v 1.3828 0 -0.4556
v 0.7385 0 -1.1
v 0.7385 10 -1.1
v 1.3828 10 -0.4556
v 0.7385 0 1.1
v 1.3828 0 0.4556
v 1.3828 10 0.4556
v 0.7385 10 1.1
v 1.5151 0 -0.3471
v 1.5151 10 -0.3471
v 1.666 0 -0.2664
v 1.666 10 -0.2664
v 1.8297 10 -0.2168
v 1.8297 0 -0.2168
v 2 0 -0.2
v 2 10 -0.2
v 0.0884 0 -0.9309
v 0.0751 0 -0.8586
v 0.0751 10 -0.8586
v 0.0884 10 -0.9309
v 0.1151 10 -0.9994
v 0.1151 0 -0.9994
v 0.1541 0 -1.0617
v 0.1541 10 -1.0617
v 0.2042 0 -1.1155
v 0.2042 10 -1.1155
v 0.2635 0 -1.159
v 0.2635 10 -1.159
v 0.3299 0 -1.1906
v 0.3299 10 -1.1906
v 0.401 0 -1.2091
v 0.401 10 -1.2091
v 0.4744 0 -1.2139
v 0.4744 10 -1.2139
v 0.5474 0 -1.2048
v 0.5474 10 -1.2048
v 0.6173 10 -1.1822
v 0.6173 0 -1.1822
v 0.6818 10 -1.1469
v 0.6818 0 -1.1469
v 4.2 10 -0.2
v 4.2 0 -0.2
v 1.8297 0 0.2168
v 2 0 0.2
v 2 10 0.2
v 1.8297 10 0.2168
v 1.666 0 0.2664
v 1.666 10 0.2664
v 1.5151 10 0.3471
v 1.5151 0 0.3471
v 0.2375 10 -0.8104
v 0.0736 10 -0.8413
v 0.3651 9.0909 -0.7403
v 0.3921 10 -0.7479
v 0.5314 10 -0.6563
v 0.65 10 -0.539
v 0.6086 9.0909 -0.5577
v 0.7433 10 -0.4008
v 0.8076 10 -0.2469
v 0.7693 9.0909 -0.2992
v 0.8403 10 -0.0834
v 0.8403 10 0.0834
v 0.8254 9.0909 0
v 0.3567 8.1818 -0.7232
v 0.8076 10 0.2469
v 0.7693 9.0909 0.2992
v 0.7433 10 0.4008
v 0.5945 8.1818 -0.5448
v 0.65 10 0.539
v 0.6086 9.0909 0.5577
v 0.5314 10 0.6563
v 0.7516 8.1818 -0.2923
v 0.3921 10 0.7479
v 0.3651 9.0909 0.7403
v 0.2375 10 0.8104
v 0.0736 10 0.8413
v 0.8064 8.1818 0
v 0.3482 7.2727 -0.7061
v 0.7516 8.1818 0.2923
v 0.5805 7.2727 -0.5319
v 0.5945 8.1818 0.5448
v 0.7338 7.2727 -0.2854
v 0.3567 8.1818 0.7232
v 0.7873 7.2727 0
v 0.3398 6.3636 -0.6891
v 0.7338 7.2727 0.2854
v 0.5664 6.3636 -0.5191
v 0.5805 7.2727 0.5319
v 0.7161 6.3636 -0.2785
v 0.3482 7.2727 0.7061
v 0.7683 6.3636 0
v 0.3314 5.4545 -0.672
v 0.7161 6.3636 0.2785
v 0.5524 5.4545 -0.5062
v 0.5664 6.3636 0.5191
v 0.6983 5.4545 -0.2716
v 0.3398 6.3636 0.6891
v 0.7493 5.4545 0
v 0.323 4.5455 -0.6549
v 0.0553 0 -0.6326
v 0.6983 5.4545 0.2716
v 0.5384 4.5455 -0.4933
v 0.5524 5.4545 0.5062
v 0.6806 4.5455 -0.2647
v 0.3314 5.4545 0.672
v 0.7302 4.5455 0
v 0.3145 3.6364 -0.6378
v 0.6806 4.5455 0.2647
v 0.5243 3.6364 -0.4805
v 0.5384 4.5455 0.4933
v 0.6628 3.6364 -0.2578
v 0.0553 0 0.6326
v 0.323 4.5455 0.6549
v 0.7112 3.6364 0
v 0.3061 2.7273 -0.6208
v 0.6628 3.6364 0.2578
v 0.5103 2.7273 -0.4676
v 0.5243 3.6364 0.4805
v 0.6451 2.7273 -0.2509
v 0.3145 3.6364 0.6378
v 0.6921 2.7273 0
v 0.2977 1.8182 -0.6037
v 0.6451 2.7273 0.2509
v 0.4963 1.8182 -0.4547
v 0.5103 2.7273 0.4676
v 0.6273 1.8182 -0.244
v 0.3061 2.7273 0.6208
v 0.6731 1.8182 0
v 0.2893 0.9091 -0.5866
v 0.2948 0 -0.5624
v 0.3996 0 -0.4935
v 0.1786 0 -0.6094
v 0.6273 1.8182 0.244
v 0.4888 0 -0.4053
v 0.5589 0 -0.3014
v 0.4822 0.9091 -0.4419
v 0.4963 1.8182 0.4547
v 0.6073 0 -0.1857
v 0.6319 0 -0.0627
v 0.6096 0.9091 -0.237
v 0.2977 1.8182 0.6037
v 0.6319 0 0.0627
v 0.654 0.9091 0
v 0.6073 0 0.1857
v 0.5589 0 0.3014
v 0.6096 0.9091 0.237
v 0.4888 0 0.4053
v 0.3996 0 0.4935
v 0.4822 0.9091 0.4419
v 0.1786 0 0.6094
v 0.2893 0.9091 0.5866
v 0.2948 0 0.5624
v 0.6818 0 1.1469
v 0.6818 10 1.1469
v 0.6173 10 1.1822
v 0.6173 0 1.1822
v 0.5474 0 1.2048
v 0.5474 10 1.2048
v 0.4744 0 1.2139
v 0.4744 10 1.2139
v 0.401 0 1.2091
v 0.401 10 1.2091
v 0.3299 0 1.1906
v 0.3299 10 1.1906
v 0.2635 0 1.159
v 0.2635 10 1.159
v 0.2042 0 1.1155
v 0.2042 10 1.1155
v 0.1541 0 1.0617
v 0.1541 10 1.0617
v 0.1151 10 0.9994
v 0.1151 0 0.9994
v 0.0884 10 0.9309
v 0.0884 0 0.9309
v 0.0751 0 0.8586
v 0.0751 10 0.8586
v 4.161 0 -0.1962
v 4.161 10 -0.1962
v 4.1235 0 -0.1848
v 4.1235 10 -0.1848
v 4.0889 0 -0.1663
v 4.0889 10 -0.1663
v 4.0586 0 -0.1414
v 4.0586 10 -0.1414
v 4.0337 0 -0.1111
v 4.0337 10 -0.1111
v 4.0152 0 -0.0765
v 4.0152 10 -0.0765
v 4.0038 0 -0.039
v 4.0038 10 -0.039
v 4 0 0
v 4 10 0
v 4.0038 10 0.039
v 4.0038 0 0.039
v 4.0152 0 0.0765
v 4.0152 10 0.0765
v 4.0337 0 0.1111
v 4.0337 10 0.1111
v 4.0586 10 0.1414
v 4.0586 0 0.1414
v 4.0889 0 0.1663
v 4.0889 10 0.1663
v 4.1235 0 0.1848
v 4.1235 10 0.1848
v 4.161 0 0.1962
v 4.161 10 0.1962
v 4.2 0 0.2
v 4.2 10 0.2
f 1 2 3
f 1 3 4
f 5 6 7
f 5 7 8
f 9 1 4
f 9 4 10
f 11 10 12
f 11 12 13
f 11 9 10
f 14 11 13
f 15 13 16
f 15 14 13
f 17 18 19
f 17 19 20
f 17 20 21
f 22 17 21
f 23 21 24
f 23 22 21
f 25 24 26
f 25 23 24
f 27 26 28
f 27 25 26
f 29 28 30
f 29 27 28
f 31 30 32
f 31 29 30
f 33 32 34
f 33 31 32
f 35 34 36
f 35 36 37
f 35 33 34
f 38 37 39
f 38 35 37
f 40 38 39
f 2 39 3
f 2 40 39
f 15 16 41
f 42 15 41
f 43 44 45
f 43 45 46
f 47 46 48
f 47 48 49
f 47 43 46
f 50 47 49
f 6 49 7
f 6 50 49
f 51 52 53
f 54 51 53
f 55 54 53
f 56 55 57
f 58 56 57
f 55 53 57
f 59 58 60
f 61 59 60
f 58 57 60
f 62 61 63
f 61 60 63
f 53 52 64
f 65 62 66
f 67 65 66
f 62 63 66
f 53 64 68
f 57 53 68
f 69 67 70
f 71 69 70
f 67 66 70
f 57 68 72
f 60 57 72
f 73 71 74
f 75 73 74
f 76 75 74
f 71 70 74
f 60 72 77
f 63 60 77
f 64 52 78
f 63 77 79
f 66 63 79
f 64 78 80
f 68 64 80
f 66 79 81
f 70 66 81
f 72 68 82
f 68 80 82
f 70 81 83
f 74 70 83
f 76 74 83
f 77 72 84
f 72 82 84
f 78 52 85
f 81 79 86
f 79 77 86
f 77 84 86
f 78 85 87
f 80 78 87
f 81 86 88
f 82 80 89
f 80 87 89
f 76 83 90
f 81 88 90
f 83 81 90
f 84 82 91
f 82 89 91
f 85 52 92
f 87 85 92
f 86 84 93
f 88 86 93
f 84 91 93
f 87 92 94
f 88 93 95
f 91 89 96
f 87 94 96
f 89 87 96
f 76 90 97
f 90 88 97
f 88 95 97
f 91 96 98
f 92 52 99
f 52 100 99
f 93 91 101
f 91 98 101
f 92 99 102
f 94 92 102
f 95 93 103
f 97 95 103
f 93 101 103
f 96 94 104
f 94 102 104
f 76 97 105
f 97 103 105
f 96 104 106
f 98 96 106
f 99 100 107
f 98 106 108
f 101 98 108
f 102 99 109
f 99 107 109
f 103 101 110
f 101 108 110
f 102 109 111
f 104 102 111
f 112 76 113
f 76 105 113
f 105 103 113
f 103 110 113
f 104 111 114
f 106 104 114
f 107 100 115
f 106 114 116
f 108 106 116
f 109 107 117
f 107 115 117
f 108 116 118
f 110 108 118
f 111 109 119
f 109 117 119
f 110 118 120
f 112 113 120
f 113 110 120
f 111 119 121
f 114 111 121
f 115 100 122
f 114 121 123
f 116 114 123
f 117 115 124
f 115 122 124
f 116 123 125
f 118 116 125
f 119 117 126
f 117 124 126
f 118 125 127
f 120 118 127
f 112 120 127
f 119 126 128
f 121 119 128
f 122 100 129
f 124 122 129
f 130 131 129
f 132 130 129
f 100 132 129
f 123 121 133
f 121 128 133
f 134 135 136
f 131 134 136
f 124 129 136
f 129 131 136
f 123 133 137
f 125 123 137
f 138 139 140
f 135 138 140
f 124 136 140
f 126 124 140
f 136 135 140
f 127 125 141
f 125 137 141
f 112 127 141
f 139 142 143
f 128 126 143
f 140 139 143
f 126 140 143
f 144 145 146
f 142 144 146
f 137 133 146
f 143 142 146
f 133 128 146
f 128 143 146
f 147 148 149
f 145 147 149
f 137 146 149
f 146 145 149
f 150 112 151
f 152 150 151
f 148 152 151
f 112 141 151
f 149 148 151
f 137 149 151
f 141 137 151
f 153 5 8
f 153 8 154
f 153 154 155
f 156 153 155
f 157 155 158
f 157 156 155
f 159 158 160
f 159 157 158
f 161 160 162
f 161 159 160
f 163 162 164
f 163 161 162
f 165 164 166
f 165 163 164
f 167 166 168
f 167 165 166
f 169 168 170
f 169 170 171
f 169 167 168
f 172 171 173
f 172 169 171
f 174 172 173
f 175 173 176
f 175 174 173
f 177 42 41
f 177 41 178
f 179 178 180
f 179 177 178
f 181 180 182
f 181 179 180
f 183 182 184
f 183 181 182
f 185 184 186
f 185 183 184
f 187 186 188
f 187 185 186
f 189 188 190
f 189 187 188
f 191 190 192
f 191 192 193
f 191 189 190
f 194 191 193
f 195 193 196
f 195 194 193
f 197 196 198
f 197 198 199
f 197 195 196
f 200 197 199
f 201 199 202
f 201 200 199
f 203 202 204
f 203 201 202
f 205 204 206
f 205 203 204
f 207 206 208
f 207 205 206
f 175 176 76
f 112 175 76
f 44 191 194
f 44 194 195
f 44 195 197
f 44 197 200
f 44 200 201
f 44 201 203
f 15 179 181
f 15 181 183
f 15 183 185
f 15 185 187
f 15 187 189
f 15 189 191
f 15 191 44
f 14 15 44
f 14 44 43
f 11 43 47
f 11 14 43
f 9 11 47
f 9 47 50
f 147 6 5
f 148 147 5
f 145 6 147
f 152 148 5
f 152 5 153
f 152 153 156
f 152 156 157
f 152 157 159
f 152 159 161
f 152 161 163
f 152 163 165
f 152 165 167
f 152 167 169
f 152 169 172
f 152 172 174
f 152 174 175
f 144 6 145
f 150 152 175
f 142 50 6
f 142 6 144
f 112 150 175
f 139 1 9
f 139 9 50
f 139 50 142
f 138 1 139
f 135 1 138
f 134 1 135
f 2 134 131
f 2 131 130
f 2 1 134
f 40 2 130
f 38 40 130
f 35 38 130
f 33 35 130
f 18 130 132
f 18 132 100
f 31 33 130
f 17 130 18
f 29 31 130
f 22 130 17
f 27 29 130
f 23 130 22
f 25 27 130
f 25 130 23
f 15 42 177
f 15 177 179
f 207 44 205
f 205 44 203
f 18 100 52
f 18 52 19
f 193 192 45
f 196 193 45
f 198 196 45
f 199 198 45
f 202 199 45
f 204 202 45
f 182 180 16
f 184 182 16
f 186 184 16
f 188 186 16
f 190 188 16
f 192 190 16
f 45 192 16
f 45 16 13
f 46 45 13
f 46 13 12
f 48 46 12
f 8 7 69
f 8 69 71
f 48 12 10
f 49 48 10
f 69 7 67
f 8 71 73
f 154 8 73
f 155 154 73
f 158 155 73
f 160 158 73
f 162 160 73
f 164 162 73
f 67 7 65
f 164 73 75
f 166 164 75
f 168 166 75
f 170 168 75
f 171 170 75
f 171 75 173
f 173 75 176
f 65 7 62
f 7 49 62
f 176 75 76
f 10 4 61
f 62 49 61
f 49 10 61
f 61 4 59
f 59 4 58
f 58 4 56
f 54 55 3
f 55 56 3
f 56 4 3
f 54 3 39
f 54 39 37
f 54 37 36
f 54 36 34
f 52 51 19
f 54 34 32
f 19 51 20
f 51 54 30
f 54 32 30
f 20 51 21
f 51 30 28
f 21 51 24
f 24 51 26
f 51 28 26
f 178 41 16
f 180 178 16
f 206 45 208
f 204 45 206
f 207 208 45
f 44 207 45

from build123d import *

# Parameters (mm, degrees)
BOSS_EXTRUDE2_DEPTH = 10
SKETCH5_R           = 0.635
CUT_EXTRUDE1_DEPTH  = 10
CUT_EXTRUDE1_DRAFT  = 1.2


with BuildPart() as part:
    # Sketch2 → Boss-Extrude2 (new body)
    with BuildSketch(Plane(origin=(0, 0, 0), x_dir=(1, 0, 0), z_dir=(0, 1, 0))):
        with BuildLine():
            Line((0.055343897, 0.632583633), (0.075113859, 0.858555332))
            ThreePointArc((0.075113859, 0.858555332), (0.329887136, 1.190582332), (0.738477631, 1.1))
            Line((0.738477631, 1.1), (1.382842712, 0.455634919))
            ThreePointArc((1.382842712, 0.455634919), (1.665996883, 0.266437351), (2, 0.2))
            Line((2, 0.2), (4.2, 0.2))
            ThreePointArc((4.2, 0.2), (4, 0), (4.2, -0.2))
            Line((4.2, -0.2), (2, -0.2))
            ThreePointArc((2, -0.2), (1.665996883, -0.266437351), (1.382842712, -0.455634919))
            Line((1.382842712, -0.455634919), (0.738477631, -1.1))
            ThreePointArc((0.738477631, -1.1), (0.329887136, -1.190582332), (0.075113859, -0.858555332))
            Line((0.075113859, -0.858555332), (0.055343897, -0.632583633))
            Line((0.055343897, -0.632583633), (0.055343897, 0.632583633))
        make_face()
    extrude(amount=BOSS_EXTRUDE2_DEPTH)


with BuildPart() as cut_extrude1_tool:
    # Sketch5 → Cut-Extrude1 (with draft: the straight prism first)
    with BuildSketch(Plane.XZ):
        Circle(SKETCH5_R)
    extrude(amount=-CUT_EXTRUDE1_DEPTH)
    # Cut-Extrude1: the draft: its side faces are tilted about the plane it starts from
    cut_extrude1_sides = [cut_extrude1_tool.faces().sort_by_distance(p)[0] for p in [
        (-0.635, 5, 0),
    ]]
    draft(cut_extrude1_sides, Plane.XZ, CUT_EXTRUDE1_DRAFT)


with BuildPart() as part_1:
    add(part.part)

    # Cut-Extrude1: cut by cut_extrude1_tool
    add(cut_extrude1_tool.part, mode=Mode.SUBTRACT)


solid = part_1.part
